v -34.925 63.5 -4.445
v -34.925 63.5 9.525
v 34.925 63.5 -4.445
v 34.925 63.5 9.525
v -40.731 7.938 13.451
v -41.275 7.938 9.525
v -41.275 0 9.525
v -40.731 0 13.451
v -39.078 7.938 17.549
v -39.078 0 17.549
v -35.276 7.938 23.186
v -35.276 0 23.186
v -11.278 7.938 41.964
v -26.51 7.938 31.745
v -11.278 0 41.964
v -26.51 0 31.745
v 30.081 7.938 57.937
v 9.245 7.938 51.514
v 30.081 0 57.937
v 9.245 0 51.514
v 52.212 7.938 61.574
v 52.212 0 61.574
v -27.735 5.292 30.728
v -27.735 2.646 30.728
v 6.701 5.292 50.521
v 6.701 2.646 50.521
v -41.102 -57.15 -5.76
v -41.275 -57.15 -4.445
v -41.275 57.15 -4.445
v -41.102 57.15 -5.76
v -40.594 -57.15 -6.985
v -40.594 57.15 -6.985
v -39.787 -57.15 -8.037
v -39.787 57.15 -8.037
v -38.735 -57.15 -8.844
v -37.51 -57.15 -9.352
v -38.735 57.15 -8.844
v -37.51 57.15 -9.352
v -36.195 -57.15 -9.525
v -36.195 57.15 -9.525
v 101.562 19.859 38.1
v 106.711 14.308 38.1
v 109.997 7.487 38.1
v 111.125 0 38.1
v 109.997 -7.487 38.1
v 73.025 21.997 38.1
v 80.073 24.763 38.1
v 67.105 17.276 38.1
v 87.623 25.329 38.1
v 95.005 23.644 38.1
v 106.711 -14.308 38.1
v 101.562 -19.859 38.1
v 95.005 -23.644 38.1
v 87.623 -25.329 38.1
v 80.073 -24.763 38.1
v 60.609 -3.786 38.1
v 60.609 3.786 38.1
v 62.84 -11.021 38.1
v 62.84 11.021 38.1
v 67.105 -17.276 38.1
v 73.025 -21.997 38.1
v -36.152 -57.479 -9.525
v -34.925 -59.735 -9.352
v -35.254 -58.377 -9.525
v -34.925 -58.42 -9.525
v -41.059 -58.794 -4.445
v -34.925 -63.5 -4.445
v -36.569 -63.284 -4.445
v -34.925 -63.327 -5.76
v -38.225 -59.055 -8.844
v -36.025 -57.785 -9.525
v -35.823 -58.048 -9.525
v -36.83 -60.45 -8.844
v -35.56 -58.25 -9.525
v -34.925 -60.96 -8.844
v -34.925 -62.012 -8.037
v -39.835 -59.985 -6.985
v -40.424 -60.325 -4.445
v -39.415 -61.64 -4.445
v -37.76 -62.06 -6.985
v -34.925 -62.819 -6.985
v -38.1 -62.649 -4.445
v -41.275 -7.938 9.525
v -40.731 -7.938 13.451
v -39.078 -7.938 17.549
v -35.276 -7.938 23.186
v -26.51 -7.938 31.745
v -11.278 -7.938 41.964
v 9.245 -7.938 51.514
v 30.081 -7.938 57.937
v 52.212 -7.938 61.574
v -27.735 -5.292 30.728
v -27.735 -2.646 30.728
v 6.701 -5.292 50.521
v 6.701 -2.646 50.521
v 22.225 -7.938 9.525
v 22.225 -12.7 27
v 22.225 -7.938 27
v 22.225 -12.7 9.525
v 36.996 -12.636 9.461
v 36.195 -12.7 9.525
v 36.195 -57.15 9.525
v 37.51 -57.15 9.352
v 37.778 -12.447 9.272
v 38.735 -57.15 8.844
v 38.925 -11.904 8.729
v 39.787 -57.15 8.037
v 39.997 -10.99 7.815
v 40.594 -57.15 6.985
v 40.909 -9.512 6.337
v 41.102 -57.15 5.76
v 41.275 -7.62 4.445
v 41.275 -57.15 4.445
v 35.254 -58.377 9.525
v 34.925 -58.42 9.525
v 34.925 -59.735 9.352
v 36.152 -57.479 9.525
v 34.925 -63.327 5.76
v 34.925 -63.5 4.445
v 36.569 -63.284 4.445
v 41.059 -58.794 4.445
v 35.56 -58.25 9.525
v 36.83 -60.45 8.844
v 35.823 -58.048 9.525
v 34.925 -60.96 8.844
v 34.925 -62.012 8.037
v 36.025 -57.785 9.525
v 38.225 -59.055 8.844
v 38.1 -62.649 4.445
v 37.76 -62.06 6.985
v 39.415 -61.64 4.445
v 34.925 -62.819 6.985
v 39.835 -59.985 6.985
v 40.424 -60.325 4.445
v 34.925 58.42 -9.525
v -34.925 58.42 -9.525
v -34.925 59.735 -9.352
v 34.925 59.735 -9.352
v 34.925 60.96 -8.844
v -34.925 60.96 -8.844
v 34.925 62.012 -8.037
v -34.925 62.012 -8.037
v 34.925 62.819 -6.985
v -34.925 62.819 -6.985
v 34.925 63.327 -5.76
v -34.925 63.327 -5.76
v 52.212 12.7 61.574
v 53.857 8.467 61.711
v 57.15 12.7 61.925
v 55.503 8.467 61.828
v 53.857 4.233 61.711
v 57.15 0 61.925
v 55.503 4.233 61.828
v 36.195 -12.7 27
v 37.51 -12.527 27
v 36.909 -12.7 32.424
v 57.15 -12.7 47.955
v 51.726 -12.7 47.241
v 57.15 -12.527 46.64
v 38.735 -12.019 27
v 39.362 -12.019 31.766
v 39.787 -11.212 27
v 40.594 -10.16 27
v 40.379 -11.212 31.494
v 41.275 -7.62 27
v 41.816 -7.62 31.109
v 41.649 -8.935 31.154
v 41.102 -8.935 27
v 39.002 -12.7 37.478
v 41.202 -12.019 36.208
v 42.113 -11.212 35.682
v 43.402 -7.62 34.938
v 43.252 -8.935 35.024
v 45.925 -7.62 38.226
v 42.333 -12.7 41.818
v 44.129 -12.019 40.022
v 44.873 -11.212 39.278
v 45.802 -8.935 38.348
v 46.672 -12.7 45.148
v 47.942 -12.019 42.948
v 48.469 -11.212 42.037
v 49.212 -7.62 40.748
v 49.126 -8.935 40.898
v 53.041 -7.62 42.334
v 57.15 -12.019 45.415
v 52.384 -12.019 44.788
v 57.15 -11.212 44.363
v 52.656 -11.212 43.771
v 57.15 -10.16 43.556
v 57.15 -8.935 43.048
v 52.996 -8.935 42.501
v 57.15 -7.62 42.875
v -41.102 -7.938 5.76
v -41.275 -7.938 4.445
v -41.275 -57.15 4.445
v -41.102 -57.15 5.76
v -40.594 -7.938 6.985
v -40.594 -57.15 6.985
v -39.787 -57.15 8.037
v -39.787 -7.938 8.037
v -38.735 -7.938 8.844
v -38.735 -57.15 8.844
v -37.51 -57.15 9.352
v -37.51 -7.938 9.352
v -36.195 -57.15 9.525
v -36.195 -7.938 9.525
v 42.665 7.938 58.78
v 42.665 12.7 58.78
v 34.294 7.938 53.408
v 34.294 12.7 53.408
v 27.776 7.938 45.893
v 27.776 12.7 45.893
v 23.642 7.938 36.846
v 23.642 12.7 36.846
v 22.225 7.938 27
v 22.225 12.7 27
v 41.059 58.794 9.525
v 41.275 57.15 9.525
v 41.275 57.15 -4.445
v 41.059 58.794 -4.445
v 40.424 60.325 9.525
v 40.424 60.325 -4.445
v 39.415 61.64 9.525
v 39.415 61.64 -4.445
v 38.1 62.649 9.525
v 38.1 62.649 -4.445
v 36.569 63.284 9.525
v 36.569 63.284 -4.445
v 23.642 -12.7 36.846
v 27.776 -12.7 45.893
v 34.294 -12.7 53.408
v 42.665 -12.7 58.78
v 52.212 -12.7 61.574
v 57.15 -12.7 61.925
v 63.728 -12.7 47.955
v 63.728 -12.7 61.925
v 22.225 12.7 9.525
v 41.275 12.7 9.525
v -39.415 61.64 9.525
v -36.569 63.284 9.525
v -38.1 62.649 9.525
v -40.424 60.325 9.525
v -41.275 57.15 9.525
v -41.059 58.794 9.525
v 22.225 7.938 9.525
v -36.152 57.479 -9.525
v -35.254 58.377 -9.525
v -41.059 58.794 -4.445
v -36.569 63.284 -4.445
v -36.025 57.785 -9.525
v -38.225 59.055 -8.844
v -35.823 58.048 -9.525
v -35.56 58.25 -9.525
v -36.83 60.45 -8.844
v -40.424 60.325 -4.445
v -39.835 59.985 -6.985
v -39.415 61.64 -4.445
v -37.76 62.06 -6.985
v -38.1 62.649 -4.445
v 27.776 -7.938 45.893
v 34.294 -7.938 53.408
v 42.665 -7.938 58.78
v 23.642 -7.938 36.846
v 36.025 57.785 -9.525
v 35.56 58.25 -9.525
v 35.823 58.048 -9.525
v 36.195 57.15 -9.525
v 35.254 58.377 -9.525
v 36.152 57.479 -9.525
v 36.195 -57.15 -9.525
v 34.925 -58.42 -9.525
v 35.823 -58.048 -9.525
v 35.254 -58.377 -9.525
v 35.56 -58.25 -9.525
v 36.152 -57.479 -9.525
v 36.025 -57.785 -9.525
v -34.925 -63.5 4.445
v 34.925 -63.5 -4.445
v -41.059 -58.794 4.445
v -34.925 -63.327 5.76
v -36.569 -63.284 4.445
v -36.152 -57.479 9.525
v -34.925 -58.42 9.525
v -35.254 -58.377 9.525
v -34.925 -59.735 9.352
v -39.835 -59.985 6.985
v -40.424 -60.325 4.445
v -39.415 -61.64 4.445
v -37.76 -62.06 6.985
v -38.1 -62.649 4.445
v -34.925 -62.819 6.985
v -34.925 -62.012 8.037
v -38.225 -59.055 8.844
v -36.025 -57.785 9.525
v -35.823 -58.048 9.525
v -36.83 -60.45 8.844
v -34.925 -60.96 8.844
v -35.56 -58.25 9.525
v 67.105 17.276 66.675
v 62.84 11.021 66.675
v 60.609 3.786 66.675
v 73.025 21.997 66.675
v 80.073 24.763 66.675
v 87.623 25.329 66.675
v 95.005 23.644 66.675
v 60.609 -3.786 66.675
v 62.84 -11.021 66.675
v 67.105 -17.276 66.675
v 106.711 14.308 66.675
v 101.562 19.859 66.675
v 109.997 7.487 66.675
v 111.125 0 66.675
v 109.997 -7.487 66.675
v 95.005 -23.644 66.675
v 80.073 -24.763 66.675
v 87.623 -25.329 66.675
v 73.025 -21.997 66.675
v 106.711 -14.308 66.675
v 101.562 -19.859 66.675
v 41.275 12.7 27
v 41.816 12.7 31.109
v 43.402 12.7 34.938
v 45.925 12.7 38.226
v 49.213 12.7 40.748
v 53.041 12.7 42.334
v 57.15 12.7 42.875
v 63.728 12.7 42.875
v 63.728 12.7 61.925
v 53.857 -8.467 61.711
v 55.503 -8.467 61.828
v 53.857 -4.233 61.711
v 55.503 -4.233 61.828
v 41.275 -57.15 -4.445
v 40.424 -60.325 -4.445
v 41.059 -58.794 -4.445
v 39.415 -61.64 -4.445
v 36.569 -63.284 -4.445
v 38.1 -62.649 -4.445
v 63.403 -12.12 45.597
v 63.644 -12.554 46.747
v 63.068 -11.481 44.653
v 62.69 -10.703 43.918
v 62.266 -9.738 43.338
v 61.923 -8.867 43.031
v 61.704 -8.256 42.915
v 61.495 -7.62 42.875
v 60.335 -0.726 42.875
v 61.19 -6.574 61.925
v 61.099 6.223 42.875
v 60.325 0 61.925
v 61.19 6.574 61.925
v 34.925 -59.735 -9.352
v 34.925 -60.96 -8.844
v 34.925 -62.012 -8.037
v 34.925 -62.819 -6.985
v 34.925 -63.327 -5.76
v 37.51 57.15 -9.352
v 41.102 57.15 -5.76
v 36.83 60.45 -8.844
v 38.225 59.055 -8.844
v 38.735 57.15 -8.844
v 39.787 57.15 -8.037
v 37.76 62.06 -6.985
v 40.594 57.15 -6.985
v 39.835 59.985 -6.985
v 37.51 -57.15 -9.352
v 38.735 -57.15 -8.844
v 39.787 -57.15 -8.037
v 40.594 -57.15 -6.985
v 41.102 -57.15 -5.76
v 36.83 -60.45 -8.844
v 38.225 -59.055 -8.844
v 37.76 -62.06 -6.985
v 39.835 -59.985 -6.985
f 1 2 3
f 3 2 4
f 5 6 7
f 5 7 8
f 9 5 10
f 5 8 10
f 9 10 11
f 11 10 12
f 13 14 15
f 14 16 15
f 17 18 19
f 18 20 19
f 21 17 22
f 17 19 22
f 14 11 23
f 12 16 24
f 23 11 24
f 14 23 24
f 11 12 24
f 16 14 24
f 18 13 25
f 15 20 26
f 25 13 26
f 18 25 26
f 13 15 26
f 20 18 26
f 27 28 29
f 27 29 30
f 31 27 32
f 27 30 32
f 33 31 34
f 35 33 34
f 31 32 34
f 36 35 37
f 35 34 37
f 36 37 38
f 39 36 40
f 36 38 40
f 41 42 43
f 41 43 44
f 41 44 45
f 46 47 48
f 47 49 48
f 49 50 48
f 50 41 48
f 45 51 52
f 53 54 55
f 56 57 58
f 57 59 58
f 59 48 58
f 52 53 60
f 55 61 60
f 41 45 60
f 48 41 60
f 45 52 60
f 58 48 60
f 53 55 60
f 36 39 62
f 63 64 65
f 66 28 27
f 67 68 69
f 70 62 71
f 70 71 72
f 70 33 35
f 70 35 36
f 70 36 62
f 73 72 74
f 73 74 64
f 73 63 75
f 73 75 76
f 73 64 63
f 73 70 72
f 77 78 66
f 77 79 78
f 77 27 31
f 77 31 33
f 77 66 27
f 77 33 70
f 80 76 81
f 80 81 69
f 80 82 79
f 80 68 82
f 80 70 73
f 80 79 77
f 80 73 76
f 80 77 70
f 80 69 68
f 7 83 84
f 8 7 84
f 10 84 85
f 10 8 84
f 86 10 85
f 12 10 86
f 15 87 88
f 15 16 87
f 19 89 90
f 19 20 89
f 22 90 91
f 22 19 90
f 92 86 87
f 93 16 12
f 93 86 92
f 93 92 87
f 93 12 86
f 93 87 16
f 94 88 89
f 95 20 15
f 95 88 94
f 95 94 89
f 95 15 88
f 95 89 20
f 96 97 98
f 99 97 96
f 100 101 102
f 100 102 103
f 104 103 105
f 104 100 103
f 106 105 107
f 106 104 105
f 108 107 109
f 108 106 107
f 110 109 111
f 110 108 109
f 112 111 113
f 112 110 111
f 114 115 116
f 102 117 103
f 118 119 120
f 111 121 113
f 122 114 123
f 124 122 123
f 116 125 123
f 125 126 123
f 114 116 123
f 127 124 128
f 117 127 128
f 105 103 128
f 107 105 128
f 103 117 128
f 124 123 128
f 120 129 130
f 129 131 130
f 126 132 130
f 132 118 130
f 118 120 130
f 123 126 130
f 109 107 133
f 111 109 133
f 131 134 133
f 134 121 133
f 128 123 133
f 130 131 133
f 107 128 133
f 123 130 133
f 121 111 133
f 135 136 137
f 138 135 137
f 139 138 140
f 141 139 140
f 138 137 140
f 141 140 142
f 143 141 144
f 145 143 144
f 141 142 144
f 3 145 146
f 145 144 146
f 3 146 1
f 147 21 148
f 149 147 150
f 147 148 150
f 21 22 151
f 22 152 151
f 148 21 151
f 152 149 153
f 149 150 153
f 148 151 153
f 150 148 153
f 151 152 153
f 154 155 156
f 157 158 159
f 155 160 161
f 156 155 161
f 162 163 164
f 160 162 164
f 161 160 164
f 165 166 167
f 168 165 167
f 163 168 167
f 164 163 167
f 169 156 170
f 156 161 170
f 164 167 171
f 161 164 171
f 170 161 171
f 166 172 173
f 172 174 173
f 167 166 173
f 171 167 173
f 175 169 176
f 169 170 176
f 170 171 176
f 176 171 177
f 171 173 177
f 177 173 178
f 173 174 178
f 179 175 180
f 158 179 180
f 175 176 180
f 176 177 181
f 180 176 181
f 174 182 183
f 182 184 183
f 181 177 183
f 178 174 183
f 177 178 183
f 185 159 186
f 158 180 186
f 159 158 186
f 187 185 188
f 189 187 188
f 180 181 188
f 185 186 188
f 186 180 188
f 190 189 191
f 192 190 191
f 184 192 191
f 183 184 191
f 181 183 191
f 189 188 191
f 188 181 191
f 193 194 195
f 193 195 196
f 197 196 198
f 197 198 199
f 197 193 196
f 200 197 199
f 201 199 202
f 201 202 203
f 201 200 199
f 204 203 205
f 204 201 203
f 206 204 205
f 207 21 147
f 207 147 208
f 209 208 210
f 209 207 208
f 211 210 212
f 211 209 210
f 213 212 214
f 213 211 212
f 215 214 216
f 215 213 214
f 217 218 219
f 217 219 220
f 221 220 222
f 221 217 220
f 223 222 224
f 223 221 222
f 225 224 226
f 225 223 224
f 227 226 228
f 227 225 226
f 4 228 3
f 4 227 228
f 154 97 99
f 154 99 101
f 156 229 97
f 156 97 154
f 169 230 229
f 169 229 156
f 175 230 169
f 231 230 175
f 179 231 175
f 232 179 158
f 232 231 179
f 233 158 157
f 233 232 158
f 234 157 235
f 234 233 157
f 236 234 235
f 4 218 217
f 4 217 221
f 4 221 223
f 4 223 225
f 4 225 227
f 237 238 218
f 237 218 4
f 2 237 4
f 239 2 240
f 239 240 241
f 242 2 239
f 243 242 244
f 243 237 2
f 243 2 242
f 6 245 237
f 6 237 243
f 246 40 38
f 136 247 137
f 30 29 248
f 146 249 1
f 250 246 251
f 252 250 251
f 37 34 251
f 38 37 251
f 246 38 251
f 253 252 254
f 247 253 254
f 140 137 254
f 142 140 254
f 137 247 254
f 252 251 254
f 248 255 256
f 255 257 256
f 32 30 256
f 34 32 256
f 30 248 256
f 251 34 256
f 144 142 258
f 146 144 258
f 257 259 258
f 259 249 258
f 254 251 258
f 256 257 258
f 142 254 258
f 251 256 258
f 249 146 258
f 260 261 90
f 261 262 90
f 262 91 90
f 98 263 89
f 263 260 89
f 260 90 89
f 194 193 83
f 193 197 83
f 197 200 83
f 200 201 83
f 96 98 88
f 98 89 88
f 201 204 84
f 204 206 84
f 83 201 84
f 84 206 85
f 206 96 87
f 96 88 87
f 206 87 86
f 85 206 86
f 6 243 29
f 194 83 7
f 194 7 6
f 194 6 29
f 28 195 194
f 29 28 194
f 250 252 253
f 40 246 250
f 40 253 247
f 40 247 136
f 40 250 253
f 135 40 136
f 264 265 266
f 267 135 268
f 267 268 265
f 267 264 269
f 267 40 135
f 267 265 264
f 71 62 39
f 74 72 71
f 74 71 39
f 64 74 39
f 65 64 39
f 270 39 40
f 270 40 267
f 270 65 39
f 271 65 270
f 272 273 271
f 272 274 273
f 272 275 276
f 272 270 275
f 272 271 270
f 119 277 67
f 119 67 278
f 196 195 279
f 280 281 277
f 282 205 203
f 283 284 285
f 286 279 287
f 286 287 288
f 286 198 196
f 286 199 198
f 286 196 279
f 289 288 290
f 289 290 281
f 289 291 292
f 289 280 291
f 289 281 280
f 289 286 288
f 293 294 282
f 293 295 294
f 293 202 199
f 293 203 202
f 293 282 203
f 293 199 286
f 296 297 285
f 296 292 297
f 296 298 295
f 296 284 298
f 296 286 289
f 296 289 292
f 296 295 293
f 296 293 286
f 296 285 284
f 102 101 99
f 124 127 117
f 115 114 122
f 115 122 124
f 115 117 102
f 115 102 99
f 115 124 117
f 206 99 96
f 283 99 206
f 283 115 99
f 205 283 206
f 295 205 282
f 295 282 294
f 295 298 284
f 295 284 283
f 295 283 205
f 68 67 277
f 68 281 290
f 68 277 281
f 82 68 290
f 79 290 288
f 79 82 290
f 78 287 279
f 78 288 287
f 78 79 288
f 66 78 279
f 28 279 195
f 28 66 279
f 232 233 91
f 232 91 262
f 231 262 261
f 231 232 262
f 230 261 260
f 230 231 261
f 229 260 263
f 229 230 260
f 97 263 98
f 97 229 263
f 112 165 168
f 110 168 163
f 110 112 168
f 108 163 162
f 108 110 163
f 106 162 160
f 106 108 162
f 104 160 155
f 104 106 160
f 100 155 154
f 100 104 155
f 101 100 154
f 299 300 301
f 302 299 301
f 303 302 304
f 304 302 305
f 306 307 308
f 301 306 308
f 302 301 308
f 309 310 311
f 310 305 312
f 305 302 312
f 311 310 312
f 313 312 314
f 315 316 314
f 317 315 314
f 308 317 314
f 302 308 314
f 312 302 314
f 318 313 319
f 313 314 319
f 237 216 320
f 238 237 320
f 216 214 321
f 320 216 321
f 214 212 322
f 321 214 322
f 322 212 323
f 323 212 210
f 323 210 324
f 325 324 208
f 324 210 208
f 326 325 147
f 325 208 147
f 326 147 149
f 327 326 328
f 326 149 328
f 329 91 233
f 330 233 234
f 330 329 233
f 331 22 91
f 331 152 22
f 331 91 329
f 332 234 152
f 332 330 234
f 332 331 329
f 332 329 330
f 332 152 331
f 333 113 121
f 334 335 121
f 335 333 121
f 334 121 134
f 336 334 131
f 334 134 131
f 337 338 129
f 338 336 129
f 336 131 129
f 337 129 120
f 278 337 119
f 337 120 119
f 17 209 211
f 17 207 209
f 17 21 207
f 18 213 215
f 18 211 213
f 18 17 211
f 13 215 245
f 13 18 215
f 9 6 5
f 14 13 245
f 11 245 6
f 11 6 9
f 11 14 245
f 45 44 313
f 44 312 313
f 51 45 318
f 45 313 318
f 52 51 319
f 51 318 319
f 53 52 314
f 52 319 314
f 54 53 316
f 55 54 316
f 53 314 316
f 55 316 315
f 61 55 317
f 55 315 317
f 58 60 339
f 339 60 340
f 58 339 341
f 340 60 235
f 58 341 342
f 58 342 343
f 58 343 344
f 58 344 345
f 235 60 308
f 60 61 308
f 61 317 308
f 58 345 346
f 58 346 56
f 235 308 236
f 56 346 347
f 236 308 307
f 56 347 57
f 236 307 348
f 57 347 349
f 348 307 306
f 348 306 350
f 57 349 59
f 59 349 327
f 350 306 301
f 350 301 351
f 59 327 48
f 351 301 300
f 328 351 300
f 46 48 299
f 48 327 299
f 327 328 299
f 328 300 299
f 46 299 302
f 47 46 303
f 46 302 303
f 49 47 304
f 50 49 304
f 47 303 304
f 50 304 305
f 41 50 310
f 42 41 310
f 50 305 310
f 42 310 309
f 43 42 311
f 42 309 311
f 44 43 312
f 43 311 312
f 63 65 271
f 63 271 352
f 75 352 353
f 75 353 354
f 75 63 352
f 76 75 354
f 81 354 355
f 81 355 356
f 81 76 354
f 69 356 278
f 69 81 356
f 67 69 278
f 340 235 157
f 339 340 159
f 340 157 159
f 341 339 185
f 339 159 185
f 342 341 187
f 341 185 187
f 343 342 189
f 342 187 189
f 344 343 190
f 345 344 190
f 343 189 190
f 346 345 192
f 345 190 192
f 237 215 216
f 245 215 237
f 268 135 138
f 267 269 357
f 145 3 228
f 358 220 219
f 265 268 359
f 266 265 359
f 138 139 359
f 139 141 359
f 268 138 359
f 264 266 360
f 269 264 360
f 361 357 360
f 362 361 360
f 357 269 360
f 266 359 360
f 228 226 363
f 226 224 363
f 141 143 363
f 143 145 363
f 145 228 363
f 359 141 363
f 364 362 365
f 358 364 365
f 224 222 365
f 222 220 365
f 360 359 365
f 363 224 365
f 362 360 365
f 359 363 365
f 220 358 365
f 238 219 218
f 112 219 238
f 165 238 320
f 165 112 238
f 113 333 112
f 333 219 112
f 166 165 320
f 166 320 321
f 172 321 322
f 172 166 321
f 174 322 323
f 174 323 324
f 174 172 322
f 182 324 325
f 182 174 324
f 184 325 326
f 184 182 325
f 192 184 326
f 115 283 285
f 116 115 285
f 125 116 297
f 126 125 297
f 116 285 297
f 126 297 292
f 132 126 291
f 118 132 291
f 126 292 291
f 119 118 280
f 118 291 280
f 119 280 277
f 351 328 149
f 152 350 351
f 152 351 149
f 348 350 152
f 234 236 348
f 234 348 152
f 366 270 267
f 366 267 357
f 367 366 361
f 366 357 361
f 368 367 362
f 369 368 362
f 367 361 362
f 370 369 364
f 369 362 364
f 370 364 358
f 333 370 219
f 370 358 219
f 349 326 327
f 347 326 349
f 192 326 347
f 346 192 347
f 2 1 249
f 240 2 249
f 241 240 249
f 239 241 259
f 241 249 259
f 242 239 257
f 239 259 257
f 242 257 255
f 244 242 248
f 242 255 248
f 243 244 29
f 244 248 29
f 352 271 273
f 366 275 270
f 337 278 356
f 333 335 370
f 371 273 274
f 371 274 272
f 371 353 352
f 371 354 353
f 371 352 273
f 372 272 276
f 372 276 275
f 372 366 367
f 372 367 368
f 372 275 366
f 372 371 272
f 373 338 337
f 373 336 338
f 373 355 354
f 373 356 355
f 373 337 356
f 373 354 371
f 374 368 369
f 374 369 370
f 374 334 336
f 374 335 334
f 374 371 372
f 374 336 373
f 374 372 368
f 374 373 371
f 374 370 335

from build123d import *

# Parameters (mm, degrees)
F1_DEPTH     = 63.5
F0_W         = 25.4
F0_H         = 19.05
F2_DEPTH     = 12.7
F3_DEPTH     = 7.9375
F5_R         = 6.35
F6_T1_DEPTH  = 114.3
F6_T3_DEPTH  = 17.4752
F6_T5_DEPTH  = 49.2125
F6_T7_DEPTH  = 69.85
F6_T9_DEPTH  = 44.45
F6_T12_ANGLE = 90
F6_T14_ANGLE = 90
F6_T16_ANGLE = 90
F6_T18_ANGLE = 90
F6_T20_ANGLE = 90
F6_T22_ANGLE = 90
F6_T26_DEPTH = 19.2779547439
F6_S27_R     = 25.4
F6_T28_DEPTH = 12
F6_T30_ANGLE = 90
F6_T35_DEPTH = 57.15
F6_T39_DEPTH = 30.1752


# Not quite as in the source:
# - a fillet or chamfer that OpenCascade refuses, or shapes differently, is made with other operations: its cross-section is extruded or revolved along the edge and cut away or added


with BuildPart() as f1:
    # F0 (on Front) → F1 (new body, symmetric)
    with BuildSketch(Plane.XZ):
        Polygon((-41.275, 9.525), (-41.275, -9.525), (41.275, -9.525), (41.275, 9.525), (22.225, 9.525), align=None)
    extrude(amount=F1_DEPTH, both=True)

    # F0 (on Front) → F2 (join, symmetric)
    with BuildSketch(Plane.XZ):
        with BuildLine():
            Line((22.225, 9.525), (41.275, 9.525))
            Line((41.275, 9.525), (41.275, 27.0002))
            ThreePointArc((41.275, 27.0002), (45.9246798487, 38.2255201513), (57.15, 42.8752))
            Line((57.15, 42.8752), (60.325, 42.8752))
            Line((60.325, 42.8752), (60.325, 61.9252))
            Line((60.325, 61.9252), (57.15, 61.9252))
            add(Edge.make_bspline(
                [(52.2120910402, 61.5743620304), (53.8564284602, 61.7203088284), (55.5029986104, 61.8377030625), (57.15, 61.9252)],
                knots=[107.7945152041, 107.7945152041, 107.7945152041, 107.7945152041, 111.5045361635, 111.5045361635, 111.5045361635, 111.5045361635], degree=3))
            ThreePointArc((52.2120910402, 61.5743620304), (30.766178296, 49.8835908608), (22.225, 27.0002))
            Line((22.225, 27.0002), (22.225, 9.525))
        make_face()
        with Locations((73.025, 52.4002)):
            Rectangle(F0_W, F0_H)
    extrude(amount=F2_DEPTH, both=True)

    # F0 (on Front) → F3 (join, symmetric)
    with BuildSketch(Plane.XZ):
        with BuildLine():
            add(Edge.make_bspline(
                [(-41.275, 9.525), (-41.4553787608, 28.9895938663), (4.4359310246, 57.3338834698), (52.2120910402, 61.5743620304)],
                knots=[0, 0, 0, 0, 107.7945152041, 107.7945152041, 107.7945152041, 107.7945152041], degree=3))
            Line((-41.275, 9.525), (22.225, 9.525))
            Line((22.225, 9.525), (22.225, 27.0002))
            ThreePointArc((22.225, 27.0002), (30.766178296, 49.8835908608), (52.2120910402, 61.5743620304))
        make_face()
    extrude(amount=F3_DEPTH, both=True)

    # F0 (on Front) → F4 (revolve)
    with BuildSketch(Plane.XZ):
        Polygon((85.725, 66.675), (85.725, 61.9252), (85.725, 42.8752), (85.725, 38.1), (111.125, 38.1), (111.125, 66.675), align=None)
    revolve(axis=Axis((85.725, 0, 52.3875), (0, 0, -1)))

    # F5
    f5_edges = [f1.edges().sort_by_distance(p)[0] for p in [
        (41.275, -63.5, 0),
        (-41.275, -63.5, 0),
        (41.275, 63.5, 0),
        (-41.275, 63.5, 0),
    ]]
    fillet(f5_edges, radius=F5_R)

    # F6: fillet of radius 5.08 on 16 edges, made by hand

    # F6_s2 → F6_t1 (cut)
    with BuildSketch(Plane.XZ.offset(-57.15)):
        with BuildLine():
            ThreePointArc((36.195, -9.525), (39.7871024484, -8.0371024484), (41.275, -4.445))
            Line((41.275, -4.445), (41.275, -9.525))
            Line((41.275, -9.525), (36.195, -9.525))
        make_face()
        with BuildLine():
            ThreePointArc((-41.275, -4.445), (-39.7871024484, -8.0371024484), (-36.195, -9.525))
            Line((-36.195, -9.525), (-41.275, -9.525))
            Line((-41.275, -9.525), (-41.275, -4.445))
        make_face()
    extrude(amount=F6_T1_DEPTH, mode=Mode.SUBTRACT)

    # F6_s4 → F6_t3 (cut)
    with BuildSketch(Plane.XY.offset(9.525)):
        with BuildLine():
            ThreePointArc((41.275, -7.62), (39.7871024484, -11.2121024484), (36.195, -12.7))
            Line((36.195, -12.7), (41.275, -12.7))
            Line((41.275, -12.7), (41.275, -7.62))
        make_face()
    extrude(amount=F6_T3_DEPTH, mode=Mode.SUBTRACT)

    # F6_s6 → F6_t5 (cut)
    with BuildSketch(Plane.XZ.offset(7.9375)):
        with BuildLine():
            ThreePointArc((-41.275, 4.445), (-39.7871024484, 8.0371024484), (-36.195, 9.525))
            Line((-36.195, 9.525), (-41.275, 9.525))
            Line((-41.275, 9.525), (-41.275, 4.445))
        make_face()
    extrude(amount=F6_T5_DEPTH, mode=Mode.SUBTRACT)

    # F6_s8 → F6_t7 (cut)
    with BuildSketch(Plane.YZ.offset(-34.925)):
        with BuildLine():
            ThreePointArc((58.42, -9.525), (62.0121024484, -8.0371024484), (63.5, -4.445))
            Line((63.5, -4.445), (63.5, -9.525))
            Line((63.5, -9.525), (58.42, -9.525))
        make_face()
        with BuildLine():
            ThreePointArc((-58.42, -9.525), (-62.0121024484, -8.0371024484), (-63.5, -4.445))
            Line((-63.5, -4.445), (-63.5, -9.525))
            Line((-63.5, -9.525), (-58.42, -9.525))
        make_face()
        with BuildLine():
            ThreePointArc((-58.42, 9.525), (-62.0121024484, 8.0371024484), (-63.5, 4.445))
            Line((-63.5, 4.445), (-63.5, 9.525))
            Line((-63.5, 9.525), (-58.42, 9.525))
        make_face()
    extrude(amount=F6_T7_DEPTH, mode=Mode.SUBTRACT)

    # F6_s10 → F6_t9 (cut)
    with BuildSketch(Plane.XZ.offset(12.7)):
        with BuildLine():
            ThreePointArc((36.195, 9.525), (39.7871024484, 8.0371024484), (41.275, 4.445))
            Line((41.275, 4.445), (41.275, 9.525))
            Line((41.275, 9.525), (36.195, 9.525))
        make_face()
    extrude(amount=F6_T9_DEPTH, mode=Mode.SUBTRACT)

    # F6_s11 → F6_t12 (revolve, cut)
    with BuildSketch(Plane.YZ.offset(34.925)):
        with BuildLine():
            ThreePointArc((-58.42, 9.525), (-62.0121024484, 8.0371024484), (-63.5, 4.445))
            Line((-63.5, 4.445), (-63.5, 9.525))
            Line((-63.5, 9.525), (-58.42, 9.525))
        make_face()
    revolve(axis=Axis((34.925, -57.15, 9.525), (0, 0, 1)), revolution_arc=F6_T12_ANGLE, mode=Mode.SUBTRACT)

    # F6_s13 → F6_t14 (revolve, cut)
    with BuildSketch(Plane.XZ.offset(-57.15)):
        with BuildLine():
            ThreePointArc((-36.195, -9.525), (-39.7871024484, -8.0371024484), (-41.275, -4.445))
            Line((-41.275, -4.445), (-41.275, -9.525))
            Line((-41.275, -9.525), (-36.195, -9.525))
        make_face()
    revolve(axis=Axis((-34.925, 57.15, -9.525), (0, 0, -1)), revolution_arc=F6_T14_ANGLE, mode=Mode.SUBTRACT)

    # F6_s15 → F6_t16 (revolve, cut)
    with BuildSketch(Plane.XZ.offset(57.15)):
        with BuildLine():
            ThreePointArc((-36.195, -9.525), (-39.7871024484, -8.0371024484), (-41.275, -4.445))
            Line((-41.275, -4.445), (-41.275, -9.525))
            Line((-41.275, -9.525), (-36.195, -9.525))
        make_face()
    revolve(axis=Axis((-34.925, -57.15, -9.525), (0, 0, 1)), revolution_arc=F6_T16_ANGLE, mode=Mode.SUBTRACT)

    # F6_s17 → F6_t18 (revolve, cut)
    with BuildSketch(Plane.YZ.offset(34.925)):
        with BuildLine():
            ThreePointArc((58.42, -9.525), (62.0121024484, -8.0371024484), (63.5, -4.445))
            Line((63.5, -4.445), (63.5, -9.525))
            Line((63.5, -9.525), (58.42, -9.525))
        make_face()
    revolve(axis=Axis((34.925, 57.15, -9.525), (0, 0, -1)), revolution_arc=F6_T18_ANGLE, mode=Mode.SUBTRACT)

    # F6_s19 → F6_t20 (revolve, cut)
    with BuildSketch(Plane.YZ.offset(34.925)):
        with BuildLine():
            ThreePointArc((-58.42, -9.525), (-62.0121024484, -8.0371024484), (-63.5, -4.445))
            Line((-63.5, -4.445), (-63.5, -9.525))
            Line((-63.5, -9.525), (-58.42, -9.525))
        make_face()
    revolve(axis=Axis((34.925, -57.15, -9.525), (0, 0, 1)), revolution_arc=F6_T20_ANGLE, mode=Mode.SUBTRACT)

    # F6_s21 → F6_t22 (revolve, cut)
    with BuildSketch(Plane.XZ.offset(57.15)):
        with BuildLine():
            ThreePointArc((-41.275, 4.445), (-39.7871024484, 8.0371024484), (-36.195, 9.525))
            Line((-36.195, 9.525), (-41.275, 9.525))
            Line((-41.275, 9.525), (-41.275, 4.445))
        make_face()
    revolve(axis=Axis((-34.925, -57.15, 9.525), (0, 0, 1)), revolution_arc=F6_T22_ANGLE, mode=Mode.SUBTRACT)


with BuildPart() as f6_tool24:
    # F6_s25 → F6_t26 (new body)
    with BuildSketch(Plane.YZ.offset(57.15)):
        with BuildLine():
            ThreePointArc((-12.7, 47.9552), (-11.2121024484, 44.3630975516), (-7.62, 42.8752))
            Line((-7.62, 42.8752), (-12.7, 42.8752))
            Line((-12.7, 42.8752), (-12.7, 47.9552))
        make_face()
    extrude(amount=F6_T26_DEPTH)

    # F6_s27 → F6_t28 (cut, symmetric)
    with BuildSketch(Plane.XY.offset(45.4)):
        with Locations((85.725, 0)):
            Circle(F6_S27_R)
    extrude(amount=F6_T28_DEPTH, both=True, mode=Mode.SUBTRACT)


with BuildPart() as f1_1:
    add(f1.part)

    # F6_t23: cut F6_tool24
    add(f6_tool24.part, mode=Mode.SUBTRACT)

    # F6_s29 → F6_t30 (revolve, cut)
    with BuildSketch(Plane.XY.offset(27.0002)):
        with BuildLine():
            ThreePointArc((36.195, -12.7), (39.7871024484, -11.2121024484), (41.275, -7.62))
            Line((41.275, -7.62), (41.275, -12.7))
            Line((41.275, -12.7), (36.195, -12.7))
        make_face()
    revolve(axis=Axis((57.15, -12.7, 27.0002), (0, 1, 0)), revolution_arc=F6_T30_ANGLE, mode=Mode.SUBTRACT)


with BuildPart() as f6_tool33:
    # F6_s34 → F6_t35 (new body)
    with BuildSketch(Plane.XZ.offset(57.15)):
        with BuildLine():
            ThreePointArc((36.195, 9.525), (39.7871024484, 8.0371024484), (41.275, 4.445))
            Line((41.275, 4.445), (41.275, 9.525))
            Line((41.275, 9.525), (36.195, 9.525))
        make_face()
    extrude(amount=-F6_T35_DEPTH)

    split(bisect_by=Plane.XZ.offset(12.7), keep=Keep.BOTTOM)


with BuildPart() as f6_tool37:
    # F6_s38 → F6_t39 (new body)
    with BuildSketch(Plane.XY.offset(-3.175)):
        with BuildLine():
            ThreePointArc((41.275, -7.62), (39.7871024484, -11.2121024484), (36.195, -12.7))
            Line((36.195, -12.7), (41.275, -12.7))
            Line((41.275, -12.7), (41.275, -7.62))
        make_face()
    extrude(amount=F6_T39_DEPTH)

    split(bisect_by=Plane.XY.offset(9.525), keep=Keep.BOTTOM)


with BuildPart() as f6_tool33_1:
    add(f6_tool33.part)

    # F6_t41: intersect F6_tool37
    add(f6_tool37.part, mode=Mode.INTERSECT)


with BuildPart() as f1_2:
    add(f1_1.part)

    # F6_t31: cut F6_tool33
    add(f6_tool33_1.part, mode=Mode.SUBTRACT)


solid = f1_2.part
